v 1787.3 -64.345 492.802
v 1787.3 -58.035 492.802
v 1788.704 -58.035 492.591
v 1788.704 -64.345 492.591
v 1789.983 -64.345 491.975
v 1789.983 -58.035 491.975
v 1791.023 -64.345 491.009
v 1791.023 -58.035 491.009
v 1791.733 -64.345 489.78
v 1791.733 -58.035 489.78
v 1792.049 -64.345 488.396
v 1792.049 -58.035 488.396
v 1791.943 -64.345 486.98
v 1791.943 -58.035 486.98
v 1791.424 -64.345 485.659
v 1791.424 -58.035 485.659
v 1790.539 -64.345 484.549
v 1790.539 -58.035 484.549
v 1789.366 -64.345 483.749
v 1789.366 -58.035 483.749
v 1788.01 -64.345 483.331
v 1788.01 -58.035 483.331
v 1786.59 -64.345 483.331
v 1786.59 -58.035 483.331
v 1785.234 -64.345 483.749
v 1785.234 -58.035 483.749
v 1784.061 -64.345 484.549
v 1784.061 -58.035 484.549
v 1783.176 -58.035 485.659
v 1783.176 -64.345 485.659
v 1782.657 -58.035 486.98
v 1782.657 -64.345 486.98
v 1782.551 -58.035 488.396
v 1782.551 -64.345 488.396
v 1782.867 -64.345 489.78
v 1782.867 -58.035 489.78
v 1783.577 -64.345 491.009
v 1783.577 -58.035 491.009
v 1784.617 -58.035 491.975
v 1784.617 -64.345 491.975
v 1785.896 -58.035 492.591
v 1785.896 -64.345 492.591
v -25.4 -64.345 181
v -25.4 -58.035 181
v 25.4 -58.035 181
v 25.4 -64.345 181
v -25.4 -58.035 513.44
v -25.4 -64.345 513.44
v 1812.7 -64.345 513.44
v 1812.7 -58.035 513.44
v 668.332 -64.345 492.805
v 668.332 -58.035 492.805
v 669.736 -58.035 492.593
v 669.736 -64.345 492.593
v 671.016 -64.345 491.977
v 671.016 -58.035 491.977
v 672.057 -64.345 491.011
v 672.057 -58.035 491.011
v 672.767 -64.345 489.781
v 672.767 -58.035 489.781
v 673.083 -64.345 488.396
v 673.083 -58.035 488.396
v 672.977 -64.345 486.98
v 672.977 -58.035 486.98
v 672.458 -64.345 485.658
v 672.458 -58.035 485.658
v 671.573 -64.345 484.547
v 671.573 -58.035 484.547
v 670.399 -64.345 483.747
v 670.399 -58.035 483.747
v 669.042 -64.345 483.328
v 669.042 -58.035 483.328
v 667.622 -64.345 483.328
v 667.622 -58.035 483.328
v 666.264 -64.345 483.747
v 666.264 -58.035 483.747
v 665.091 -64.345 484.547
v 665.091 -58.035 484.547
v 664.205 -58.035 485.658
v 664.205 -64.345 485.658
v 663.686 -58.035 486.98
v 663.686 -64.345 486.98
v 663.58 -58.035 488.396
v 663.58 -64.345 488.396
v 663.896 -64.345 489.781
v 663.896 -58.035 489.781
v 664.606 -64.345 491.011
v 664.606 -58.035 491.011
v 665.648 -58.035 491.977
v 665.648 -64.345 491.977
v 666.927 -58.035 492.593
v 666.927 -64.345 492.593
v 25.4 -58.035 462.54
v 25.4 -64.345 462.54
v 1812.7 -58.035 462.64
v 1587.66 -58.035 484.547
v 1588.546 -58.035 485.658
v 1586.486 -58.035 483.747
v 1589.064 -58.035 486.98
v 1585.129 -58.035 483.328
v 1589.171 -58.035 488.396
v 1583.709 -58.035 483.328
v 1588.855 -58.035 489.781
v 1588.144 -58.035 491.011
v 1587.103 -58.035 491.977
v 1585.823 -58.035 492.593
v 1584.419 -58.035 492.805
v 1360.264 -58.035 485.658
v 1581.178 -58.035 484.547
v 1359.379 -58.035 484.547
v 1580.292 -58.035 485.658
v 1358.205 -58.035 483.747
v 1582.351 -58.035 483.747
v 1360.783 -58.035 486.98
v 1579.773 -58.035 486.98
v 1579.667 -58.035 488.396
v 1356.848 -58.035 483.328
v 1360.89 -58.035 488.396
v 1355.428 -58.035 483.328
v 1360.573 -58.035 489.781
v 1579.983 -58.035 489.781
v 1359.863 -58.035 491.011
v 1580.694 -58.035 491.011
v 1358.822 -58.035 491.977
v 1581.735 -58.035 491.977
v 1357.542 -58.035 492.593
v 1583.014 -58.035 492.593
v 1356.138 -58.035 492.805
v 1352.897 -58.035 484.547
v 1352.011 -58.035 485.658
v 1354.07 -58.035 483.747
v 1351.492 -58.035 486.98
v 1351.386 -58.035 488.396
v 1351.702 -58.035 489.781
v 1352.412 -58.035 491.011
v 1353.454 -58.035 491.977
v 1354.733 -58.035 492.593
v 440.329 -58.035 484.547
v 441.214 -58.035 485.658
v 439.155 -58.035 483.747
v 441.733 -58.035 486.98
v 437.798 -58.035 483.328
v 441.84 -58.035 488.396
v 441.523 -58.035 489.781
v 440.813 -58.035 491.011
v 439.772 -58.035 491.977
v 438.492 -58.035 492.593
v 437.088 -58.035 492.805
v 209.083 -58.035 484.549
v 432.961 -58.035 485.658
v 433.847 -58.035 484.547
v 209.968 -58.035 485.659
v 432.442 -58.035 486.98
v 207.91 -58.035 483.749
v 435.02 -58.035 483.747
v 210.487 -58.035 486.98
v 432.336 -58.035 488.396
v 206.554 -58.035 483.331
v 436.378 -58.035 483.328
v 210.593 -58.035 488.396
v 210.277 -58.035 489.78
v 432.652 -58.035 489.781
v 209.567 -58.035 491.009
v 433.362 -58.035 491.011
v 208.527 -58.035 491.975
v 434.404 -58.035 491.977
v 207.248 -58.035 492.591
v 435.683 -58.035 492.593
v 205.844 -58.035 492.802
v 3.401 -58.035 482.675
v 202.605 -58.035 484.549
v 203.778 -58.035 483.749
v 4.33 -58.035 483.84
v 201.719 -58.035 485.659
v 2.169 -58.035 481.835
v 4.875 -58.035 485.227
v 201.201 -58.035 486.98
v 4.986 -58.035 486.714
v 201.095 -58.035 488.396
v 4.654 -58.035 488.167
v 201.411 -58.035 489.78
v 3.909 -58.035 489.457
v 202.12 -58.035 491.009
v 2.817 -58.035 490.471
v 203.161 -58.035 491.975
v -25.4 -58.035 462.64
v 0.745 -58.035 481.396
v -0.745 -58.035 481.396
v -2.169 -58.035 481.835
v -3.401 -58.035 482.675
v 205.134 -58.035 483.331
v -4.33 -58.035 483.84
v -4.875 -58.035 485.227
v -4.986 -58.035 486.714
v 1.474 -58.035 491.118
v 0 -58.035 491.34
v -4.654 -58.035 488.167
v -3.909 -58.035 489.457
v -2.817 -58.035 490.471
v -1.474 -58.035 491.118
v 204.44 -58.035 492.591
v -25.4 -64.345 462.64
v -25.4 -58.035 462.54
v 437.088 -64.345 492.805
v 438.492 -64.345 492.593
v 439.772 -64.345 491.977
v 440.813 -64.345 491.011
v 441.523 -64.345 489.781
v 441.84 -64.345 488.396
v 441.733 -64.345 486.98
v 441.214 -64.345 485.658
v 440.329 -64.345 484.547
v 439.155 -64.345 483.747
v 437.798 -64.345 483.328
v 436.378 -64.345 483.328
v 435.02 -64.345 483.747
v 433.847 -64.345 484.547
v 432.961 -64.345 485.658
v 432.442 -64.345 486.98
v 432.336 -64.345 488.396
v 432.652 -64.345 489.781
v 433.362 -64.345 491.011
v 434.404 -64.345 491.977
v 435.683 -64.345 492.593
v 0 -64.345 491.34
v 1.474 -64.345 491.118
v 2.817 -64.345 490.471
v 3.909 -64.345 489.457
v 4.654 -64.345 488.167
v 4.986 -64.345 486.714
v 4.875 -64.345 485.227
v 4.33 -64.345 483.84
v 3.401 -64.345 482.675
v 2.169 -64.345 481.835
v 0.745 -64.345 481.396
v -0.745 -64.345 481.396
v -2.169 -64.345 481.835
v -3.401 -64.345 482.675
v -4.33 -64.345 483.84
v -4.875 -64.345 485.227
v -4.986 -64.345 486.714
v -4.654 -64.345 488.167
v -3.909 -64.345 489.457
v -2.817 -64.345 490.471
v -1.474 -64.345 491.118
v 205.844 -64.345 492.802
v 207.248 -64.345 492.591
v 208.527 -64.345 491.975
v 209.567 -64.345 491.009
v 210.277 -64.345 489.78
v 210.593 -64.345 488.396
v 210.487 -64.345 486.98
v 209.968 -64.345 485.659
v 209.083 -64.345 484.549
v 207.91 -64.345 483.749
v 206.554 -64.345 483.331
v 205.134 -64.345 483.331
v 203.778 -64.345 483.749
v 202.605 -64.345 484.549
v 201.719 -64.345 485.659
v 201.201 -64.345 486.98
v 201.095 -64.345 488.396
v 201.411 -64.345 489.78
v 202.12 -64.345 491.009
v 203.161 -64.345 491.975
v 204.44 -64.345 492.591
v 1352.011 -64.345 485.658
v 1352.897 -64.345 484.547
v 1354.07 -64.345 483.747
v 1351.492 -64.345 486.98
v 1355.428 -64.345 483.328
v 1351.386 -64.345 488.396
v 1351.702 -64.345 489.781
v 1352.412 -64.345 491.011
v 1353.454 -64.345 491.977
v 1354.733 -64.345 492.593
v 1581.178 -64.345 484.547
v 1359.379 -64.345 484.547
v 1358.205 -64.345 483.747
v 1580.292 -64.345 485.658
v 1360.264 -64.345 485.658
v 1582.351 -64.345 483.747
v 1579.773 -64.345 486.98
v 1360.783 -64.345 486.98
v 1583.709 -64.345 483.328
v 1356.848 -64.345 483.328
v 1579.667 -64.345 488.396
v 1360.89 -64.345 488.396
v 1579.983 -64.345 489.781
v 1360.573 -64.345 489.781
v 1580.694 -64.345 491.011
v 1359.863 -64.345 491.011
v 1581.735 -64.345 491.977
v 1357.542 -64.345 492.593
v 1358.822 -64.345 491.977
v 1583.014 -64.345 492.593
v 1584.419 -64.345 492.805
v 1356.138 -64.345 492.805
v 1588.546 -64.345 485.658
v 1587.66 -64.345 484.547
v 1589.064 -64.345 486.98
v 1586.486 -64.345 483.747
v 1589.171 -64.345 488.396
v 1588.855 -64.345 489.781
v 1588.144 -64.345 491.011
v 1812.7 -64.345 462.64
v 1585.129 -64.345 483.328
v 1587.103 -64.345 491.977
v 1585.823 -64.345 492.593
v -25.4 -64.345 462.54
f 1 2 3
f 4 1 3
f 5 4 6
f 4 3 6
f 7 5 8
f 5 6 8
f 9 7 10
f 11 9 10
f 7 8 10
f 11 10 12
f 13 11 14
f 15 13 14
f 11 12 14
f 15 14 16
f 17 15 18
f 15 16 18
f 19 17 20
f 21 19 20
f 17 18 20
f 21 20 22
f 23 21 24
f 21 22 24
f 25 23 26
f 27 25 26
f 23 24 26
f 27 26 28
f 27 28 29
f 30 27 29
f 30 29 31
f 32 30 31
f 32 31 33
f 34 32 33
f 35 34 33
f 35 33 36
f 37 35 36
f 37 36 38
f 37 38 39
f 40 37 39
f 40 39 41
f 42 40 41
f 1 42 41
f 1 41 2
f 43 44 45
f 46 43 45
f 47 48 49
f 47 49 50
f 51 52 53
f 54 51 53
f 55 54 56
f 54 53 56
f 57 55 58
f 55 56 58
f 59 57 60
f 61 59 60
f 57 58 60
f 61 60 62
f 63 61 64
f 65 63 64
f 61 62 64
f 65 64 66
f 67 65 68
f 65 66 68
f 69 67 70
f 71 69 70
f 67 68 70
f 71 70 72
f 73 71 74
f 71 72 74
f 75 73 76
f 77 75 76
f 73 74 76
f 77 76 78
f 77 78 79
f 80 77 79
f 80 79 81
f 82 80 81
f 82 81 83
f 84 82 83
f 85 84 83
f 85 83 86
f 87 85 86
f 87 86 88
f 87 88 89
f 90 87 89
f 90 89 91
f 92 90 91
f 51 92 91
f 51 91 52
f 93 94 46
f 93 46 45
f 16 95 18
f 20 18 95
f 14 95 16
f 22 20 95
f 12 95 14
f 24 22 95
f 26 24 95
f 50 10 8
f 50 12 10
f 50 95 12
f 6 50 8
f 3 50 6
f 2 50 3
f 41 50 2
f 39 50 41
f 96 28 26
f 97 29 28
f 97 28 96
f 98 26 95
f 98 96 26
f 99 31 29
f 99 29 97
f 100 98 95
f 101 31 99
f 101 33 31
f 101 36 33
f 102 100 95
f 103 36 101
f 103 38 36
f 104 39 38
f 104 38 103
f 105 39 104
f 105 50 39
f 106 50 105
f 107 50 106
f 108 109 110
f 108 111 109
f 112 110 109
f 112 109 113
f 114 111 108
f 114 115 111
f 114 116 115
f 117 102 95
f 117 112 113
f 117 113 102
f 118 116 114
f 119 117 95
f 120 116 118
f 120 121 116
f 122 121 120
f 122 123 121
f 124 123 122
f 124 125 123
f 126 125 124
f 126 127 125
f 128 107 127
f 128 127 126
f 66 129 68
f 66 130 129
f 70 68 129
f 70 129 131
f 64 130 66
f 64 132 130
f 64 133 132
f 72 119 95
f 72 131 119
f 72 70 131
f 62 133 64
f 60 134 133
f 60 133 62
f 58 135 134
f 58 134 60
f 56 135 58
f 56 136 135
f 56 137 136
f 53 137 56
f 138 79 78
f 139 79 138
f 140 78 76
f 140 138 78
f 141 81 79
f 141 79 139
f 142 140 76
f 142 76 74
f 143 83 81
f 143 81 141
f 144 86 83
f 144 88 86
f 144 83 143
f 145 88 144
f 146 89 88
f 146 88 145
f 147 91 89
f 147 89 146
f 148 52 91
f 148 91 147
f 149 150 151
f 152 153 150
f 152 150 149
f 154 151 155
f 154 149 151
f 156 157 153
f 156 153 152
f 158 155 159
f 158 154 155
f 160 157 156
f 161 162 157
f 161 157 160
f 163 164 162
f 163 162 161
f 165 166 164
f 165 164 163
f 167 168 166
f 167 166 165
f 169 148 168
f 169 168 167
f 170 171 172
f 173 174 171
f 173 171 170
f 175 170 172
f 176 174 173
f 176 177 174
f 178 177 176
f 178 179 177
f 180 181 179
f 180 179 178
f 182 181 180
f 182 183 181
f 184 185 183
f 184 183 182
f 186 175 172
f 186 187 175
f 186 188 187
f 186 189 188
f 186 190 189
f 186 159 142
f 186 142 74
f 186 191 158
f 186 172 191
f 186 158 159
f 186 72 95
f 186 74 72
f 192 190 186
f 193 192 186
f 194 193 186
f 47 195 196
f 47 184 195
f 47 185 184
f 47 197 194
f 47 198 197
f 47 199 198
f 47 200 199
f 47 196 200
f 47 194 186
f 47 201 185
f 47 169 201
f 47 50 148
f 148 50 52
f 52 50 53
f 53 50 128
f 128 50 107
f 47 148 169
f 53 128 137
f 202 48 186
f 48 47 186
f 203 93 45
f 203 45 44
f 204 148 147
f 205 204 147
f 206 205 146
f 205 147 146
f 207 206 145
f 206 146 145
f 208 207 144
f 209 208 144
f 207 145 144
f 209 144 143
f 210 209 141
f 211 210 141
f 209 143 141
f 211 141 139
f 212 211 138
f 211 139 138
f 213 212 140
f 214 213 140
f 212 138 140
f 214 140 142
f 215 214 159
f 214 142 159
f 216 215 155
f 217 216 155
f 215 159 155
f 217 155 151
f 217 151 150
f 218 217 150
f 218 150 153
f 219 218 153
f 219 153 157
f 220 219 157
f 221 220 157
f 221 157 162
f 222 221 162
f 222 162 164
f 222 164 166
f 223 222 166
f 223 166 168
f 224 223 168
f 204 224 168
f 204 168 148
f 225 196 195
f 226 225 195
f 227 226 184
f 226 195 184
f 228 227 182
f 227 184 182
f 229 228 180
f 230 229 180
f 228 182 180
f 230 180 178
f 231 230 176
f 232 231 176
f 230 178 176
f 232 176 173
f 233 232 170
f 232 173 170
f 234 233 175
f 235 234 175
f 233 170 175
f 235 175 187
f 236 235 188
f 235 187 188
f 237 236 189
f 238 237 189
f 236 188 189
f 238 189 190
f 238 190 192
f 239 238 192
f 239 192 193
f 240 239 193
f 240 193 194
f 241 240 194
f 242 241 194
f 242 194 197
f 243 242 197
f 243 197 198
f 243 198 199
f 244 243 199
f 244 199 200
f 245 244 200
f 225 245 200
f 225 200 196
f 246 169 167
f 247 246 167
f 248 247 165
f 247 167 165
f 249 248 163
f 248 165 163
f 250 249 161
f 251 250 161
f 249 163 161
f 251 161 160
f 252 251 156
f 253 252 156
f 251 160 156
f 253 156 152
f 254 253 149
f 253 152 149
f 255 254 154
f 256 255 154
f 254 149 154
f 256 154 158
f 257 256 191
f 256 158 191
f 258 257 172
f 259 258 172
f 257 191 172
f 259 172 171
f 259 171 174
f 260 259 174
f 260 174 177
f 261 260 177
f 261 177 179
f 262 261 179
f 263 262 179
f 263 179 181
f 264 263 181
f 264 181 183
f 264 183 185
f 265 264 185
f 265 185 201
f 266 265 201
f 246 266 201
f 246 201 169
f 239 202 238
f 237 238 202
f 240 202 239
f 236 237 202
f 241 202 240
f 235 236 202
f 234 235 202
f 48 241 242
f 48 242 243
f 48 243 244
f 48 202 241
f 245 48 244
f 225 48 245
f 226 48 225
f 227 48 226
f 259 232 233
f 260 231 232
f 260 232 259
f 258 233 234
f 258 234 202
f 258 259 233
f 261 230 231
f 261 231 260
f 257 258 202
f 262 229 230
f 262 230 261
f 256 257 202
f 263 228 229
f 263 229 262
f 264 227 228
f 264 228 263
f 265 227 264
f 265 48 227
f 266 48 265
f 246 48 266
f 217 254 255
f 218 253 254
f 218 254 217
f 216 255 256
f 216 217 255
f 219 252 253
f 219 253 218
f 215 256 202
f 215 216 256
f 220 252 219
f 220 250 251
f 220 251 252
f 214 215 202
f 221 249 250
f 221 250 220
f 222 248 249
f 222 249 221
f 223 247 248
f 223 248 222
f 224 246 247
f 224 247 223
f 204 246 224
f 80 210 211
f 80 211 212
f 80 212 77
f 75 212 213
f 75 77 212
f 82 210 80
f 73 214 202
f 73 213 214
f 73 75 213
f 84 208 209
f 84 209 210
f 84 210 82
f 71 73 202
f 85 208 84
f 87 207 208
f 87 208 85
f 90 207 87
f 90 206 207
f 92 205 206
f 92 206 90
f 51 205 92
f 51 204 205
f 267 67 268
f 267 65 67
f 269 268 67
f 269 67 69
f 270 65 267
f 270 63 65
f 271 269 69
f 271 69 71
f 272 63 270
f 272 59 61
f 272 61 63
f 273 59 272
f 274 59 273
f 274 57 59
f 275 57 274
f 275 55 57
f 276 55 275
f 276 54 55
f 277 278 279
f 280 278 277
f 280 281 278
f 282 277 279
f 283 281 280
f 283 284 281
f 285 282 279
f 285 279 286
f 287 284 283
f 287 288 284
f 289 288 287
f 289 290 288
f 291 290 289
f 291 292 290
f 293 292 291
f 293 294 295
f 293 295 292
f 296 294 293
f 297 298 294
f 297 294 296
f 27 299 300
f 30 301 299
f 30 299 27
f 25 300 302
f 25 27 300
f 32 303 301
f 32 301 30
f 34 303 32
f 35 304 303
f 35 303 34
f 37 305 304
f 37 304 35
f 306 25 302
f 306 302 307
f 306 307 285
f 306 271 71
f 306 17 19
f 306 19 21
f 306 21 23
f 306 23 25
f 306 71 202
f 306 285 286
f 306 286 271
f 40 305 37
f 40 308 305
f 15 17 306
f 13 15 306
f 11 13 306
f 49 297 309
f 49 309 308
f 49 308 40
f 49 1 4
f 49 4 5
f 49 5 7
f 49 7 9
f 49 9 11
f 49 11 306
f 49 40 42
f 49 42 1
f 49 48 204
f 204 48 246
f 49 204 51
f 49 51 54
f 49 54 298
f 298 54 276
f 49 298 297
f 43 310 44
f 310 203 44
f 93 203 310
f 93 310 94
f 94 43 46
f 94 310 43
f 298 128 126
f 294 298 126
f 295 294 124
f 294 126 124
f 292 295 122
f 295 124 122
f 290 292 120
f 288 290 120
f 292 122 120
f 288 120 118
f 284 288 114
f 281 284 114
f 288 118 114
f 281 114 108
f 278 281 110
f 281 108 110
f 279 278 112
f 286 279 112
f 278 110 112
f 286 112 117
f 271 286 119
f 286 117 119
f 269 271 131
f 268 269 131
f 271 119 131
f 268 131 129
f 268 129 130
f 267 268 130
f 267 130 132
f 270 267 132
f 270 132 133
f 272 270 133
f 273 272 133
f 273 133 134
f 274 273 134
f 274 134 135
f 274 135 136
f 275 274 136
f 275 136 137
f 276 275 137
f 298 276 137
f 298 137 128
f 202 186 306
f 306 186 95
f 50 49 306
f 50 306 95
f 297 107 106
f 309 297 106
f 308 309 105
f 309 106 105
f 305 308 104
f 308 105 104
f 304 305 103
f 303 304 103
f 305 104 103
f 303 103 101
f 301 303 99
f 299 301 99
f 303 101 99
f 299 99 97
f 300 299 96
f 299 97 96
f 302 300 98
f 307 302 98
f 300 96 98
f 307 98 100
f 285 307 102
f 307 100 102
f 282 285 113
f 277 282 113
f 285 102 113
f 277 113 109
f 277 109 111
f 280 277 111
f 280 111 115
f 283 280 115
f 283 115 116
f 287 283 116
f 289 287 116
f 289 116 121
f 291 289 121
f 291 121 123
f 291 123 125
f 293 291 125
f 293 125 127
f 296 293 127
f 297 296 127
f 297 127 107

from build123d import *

# Parameters (mm, degrees)
CROQUIS2_W              = 50.8
CROQUIS2_H              = 128.69
SALIENTE_EXTRUIR1_DEPTH = 6.31
CROQUIS3_W              = 50.8
CROQUIS3_H              = 6.31
SALIENTE_EXTRUIR2_DEPTH = 507.13
CROQUIS4_W              = 50.8
CROQUIS4_H              = 6.31
SALIENTE_EXTRUIR3_DEPTH = 1787.3
CROQUIS9_W              = 50.8
CROQUIS9_H              = 6.31
SALIENTE_EXTRUIR4_DEPTH = 98
CROQUIS12_R             = 5
CORTAR_EXTRUIR1_DEPTH   = 10
CORTAR_EXTRUIR2_DEPTH   = 73
CROQUIS16_W             = 47.2
CROQUIS16_H             = 71.54029971
CORTAR_EXTRUIR5_DEPTH   = 10
CROQUIS25_W             = 50.8
CROQUIS25_H             = 0.1
CORTAR_EXTRUIR14_DEPTH  = 50.8
CROQUIS24_W             = 50.8
CROQUIS24_H             = 0.1
CORTAR_EXTRUIR15_DEPTH  = 50.8
CROQUIS26_R             = 4.7625
CORTAR_EXTRUIR16_DEPTH  = 33
CROQUIS27_R             = 5
CORTAR_EXTRUIR17_DEPTH  = 33
CROQUIS32_R             = 5
CORTAR_EXTRUIR22_DEPTH  = 50
CROQUIS33_R             = 5
CORTAR_EXTRUIR23_DEPTH  = 50
CROQUIS34_R             = 4.765
CROQUIS34_R_2           = 4.7625
CORTAR_EXTRUIR24_DEPTH  = 10
CROQUIS35_R             = 4.765
CROQUIS35_R_2           = 4.7625
CORTAR_EXTRUIR25_DEPTH  = 10
CROQUIS36_R             = 5
CORTAR_EXTRUIR26_DEPTH  = 10
CROQUIS37_W             = 50.8
CROQUIS37_H             = 6.31
SALIENTE_EXTRUIR5_DEPTH = 100
CORTAR_EXTRUIR27_DEPTH  = 135
CROQUIS40_W             = 50.8
CROQUIS40_H             = 181
CORTAR_EXTRUIR28_DEPTH  = 74
CROQUIS42_W             = 161.497999248
CROQUIS42_H             = 238.597734352
CORTAR_EXTRUIR30_DEPTH  = 87


with BuildPart() as part:
    # Croquis2 → Saliente-Extruir1 (new body)
    with BuildSketch(Plane.XY):
        Rectangle(CROQUIS2_W, CROQUIS2_H)
    extrude(amount=SALIENTE_EXTRUIR1_DEPTH)

    # Croquis3 → Saliente-Extruir2 (add)
    with BuildSketch(Plane.XY.offset(6.31)):
        with Locations((0, -61.19)):
            Rectangle(CROQUIS3_W, CROQUIS3_H)
    extrude(amount=SALIENTE_EXTRUIR2_DEPTH)

    # Croquis4 → Saliente-Extruir3 (add)
    with BuildSketch(Plane(origin=(25.4, 0, 0), x_dir=(0, 0, -1), z_dir=(1, 0, 0))):
        with Locations((-488.04, -61.19)):
            Rectangle(CROQUIS4_W, CROQUIS4_H)
    extrude(amount=SALIENTE_EXTRUIR3_DEPTH)

    # Barrer2: sweep along a curve in space
    with BuildLine() as barrer2_path:
        Line((1787.3, -61.19, 513.44), (1787.3, -61.19, 629.44))
        Line((1787.3, -61.19, 629.44), (1787.3, 63.52, 629.44))
        Line((1787.3, 63.52, 629.44), (1787.3, 63.52, 1423.44))
    # Croquis9 → Barrer2 (sweep)
    with BuildSketch(Plane.XY.offset(513.44)):
        with Locations((1787.3, -61.19)):
            Rectangle(CROQUIS9_W, CROQUIS9_H)
    sweep(path=barrer2_path.line, transition=Transition.RIGHT)

    # Croquis11 → Saliente-Extruir4 (add)
    with BuildSketch(Plane.ZY.offset(25.4)):
        Polygon((0, 64.345), (-33.068312374, 124.322347428), (-27.542535245, 127.368966394), (6.31, 64.345), align=None)
    extrude(amount=-SALIENTE_EXTRUIR4_DEPTH)

    # Croquis12 → Cortar-Extruir1 (cut)
    with BuildSketch(Plane(origin=(0, 66.675, 0), x_dir=(1, 0, 0), z_dir=(0, 1, 0))):
        with Locations((1787.3, -1390.44)):
            Circle(CROQUIS12_R)
        with Locations((1787.3, -1170.44)):
            Circle(CROQUIS12_R)
    extrude(amount=-CORTAR_EXTRUIR1_DEPTH, mode=Mode.SUBTRACT)

    # Croquis13 → Cortar-Extruir2 (cut)
    with BuildSketch(Plane(origin=(1812.7, 0, 0), x_dir=(0, 0, -1), z_dir=(1, 0, 0))):
        Polygon((-632.595, 53.56128726), (-626.285, 53.56128726), (-626.285, 66.675), (-1423.44, 66.675), (-1423.44, 60.365), (-632.595, 60.365), align=None)
    extrude(amount=-CORTAR_EXTRUIR2_DEPTH, mode=Mode.SUBTRACT)

    # Croquis16 → Cortar-Extruir5 (cut)
    with BuildSketch(Plane(origin=(0, 17.038152429, 31.720281459), x_dir=(1, 0, 0), z_dir=(0, 0.4731953232328629, 0.880957539311939))):
        with Locations((49, 89.469500232)):
            Rectangle(CROQUIS16_W, CROQUIS16_H)
    extrude(amount=-CORTAR_EXTRUIR5_DEPTH, mode=Mode.SUBTRACT)

    # Croquis25 → Cortar-Extruir14 (cut)
    with BuildSketch(Plane(origin=(0, -58.035, 0), x_dir=(1, 0, 0), z_dir=(0, 1, 0))):
        with Locations((1787.3, -513.49)):
            Rectangle(CROQUIS25_W, CROQUIS25_H)
    extrude(amount=-CORTAR_EXTRUIR14_DEPTH, mode=Mode.SUBTRACT)


with BuildPart() as cortar_extruir14_piece_1:
    # of the separate pieces the step leaves, piece 1, a body of its own (cortar_extruir14_pieces)
    add(part.part.solids().sort_by_distance((-25.4, -58.035, 6.31))[0])

    # Croquis24 → Cortar-Extruir15 (cut)
    with BuildSketch(Plane(origin=(0, -58.035, 0), x_dir=(1, 0, 0), z_dir=(0, 1, 0))):
        with Locations((0, -462.59)):
            Rectangle(CROQUIS24_W, CROQUIS24_H)
    extrude(amount=-CORTAR_EXTRUIR15_DEPTH, mode=Mode.SUBTRACT)


with BuildPart() as cortar_extruir14_piece_2:
    # of the separate pieces the step leaves, piece 2, a body of its own (cortar_extruir14_pieces)
    add(part.part.solids().sort_by_distance((1812.7, -58.035, 513.54))[0])

    # Croquis27 → Cortar-Extruir17 (cut)
    with BuildSketch(Plane(origin=(0, 0, 626.285), x_dir=(-1, 0, 0), z_dir=(0, 0, -1))):
        with Locations((-1787.3, 19.56128726)):
            Circle(CROQUIS27_R)
    extrude(amount=-CORTAR_EXTRUIR17_DEPTH, mode=Mode.SUBTRACT)

    # Croquis37 → Saliente-Extruir5 (add)
    with BuildSketch(Plane(origin=(0, 53.56128726, 0), x_dir=(1, 0, 0), z_dir=(0, 1, 0))):
        with Locations((1787.3, -629.44)):
            Rectangle(CROQUIS37_W, CROQUIS37_H)
    extrude(amount=SALIENTE_EXTRUIR5_DEPTH)

    # Croquis42 → Cortar-Extruir30 (cut)
    with BuildSketch(Plane(origin=(1812.7, 0, 0), x_dir=(0, 0, -1), z_dir=(1, 0, 0))):
        with Locations((-594.288999624, 54.953867176)):
            Rectangle(CROQUIS42_W, CROQUIS42_H)
    extrude(amount=-CORTAR_EXTRUIR30_DEPTH, mode=Mode.SUBTRACT)


with BuildPart() as cortar_extruir15_piece_1:
    # of the separate pieces the step leaves, piece 1, a body of its own (cortar_extruir15_pieces)
    add(cortar_extruir14_piece_1.part.solids().sort_by_distance((-25.4, -58.035, 462.64))[0])

    # Croquis26 → Cortar-Extruir16 (cut)
    with BuildSketch(Plane(origin=(0, -58.035, 0), x_dir=(1, 0, 0), z_dir=(0, 1, 0))):
        with Locations((1787.3, -488.04)):
            Circle(CROQUIS26_R)
    extrude(amount=-CORTAR_EXTRUIR16_DEPTH, mode=Mode.SUBTRACT)

    # Croquis32 → Cortar-Extruir22 (cut)
    with BuildSketch(Plane(origin=(0, -58.035, 0), x_dir=(1, 0, 0), z_dir=(0, 1, 0))):
        with Locations((0, -486.34)):
            Circle(CROQUIS32_R)
    extrude(amount=-CORTAR_EXTRUIR22_DEPTH, mode=Mode.SUBTRACT)

    # Croquis35 → Cortar-Extruir25 (cut)
    with BuildSketch(Plane(origin=(0, -58.035, 0), x_dir=(1, 0, 0), z_dir=(0, 1, 0))):
        with Locations((1584.418928683, -488.04)):
            Circle(CROQUIS35_R)
        with Locations((1356.137857365, -488.04)):
            Circle(CROQUIS35_R)
        with Locations((668.331786048, -488.04)):
            Circle(CROQUIS35_R)
        with Locations((437.087857365, -488.04)):
            Circle(CROQUIS35_R)
        with Locations((205.843928683, -488.04)):
            Circle(CROQUIS35_R_2)
    extrude(amount=-CORTAR_EXTRUIR25_DEPTH, mode=Mode.SUBTRACT)


with BuildPart() as cortar_extruir15_piece_2:
    # of the separate pieces the step leaves, piece 2, a body of its own (cortar_extruir15_pieces)
    add(cortar_extruir14_piece_1.part.solids().sort_by_distance((-25.4, -58.035, 6.31))[0])

    # Croquis33 → Cortar-Extruir23 (cut)
    with BuildSketch(Plane(origin=(0, 17.038152429, 31.720281459), x_dir=(1, 0, 0), z_dir=(0, 0.473195323232863, 0.8809575393119389))):
        with Locations((0, 98.119650087)):
            Circle(CROQUIS33_R)
    extrude(amount=-CORTAR_EXTRUIR23_DEPTH, mode=Mode.SUBTRACT)

    # Croquis34 → Cortar-Extruir24 (cut)
    with BuildSketch(Plane.XY.offset(6.31)):
        with Locations((12.7, -27.44)):
            Circle(CROQUIS34_R)
        with Locations((-12.7, 33.75)):
            Circle(CROQUIS34_R_2)
    extrude(amount=-CORTAR_EXTRUIR24_DEPTH, mode=Mode.SUBTRACT)

    # Croquis36 → Cortar-Extruir26 (cut)
    with BuildSketch(Plane(origin=(0, -58.035, 0), x_dir=(1, 0, 0), z_dir=(0, 1, 0))):
        with Locations((0, -105.807204666)):
            Circle(CROQUIS36_R)
    extrude(amount=-CORTAR_EXTRUIR26_DEPTH, mode=Mode.SUBTRACT)

    # Croquis39 → Cortar-Extruir27 (cut)
    with BuildSketch(Plane.ZY.offset(25.4)):
        Polygon((6.31, -58.035), (0, -58.035), (0, 64.345), (-33.068312374, 124.322347428), (-27.542535245, 127.368966394), (6.31, 64.345), align=None)
    extrude(amount=-CORTAR_EXTRUIR27_DEPTH, mode=Mode.SUBTRACT)

    # Croquis40 → Cortar-Extruir28 (cut)
    with BuildSketch(Plane(origin=(0, -58.035, 0), x_dir=(1, 0, 0), z_dir=(0, 1, 0))):
        with Locations((0, -90.5)):
            Rectangle(CROQUIS40_W, CROQUIS40_H)
    extrude(amount=-CORTAR_EXTRUIR28_DEPTH, mode=Mode.SUBTRACT)


solid = Compound([cortar_extruir15_piece_1.part, cortar_extruir15_piece_2.part])
